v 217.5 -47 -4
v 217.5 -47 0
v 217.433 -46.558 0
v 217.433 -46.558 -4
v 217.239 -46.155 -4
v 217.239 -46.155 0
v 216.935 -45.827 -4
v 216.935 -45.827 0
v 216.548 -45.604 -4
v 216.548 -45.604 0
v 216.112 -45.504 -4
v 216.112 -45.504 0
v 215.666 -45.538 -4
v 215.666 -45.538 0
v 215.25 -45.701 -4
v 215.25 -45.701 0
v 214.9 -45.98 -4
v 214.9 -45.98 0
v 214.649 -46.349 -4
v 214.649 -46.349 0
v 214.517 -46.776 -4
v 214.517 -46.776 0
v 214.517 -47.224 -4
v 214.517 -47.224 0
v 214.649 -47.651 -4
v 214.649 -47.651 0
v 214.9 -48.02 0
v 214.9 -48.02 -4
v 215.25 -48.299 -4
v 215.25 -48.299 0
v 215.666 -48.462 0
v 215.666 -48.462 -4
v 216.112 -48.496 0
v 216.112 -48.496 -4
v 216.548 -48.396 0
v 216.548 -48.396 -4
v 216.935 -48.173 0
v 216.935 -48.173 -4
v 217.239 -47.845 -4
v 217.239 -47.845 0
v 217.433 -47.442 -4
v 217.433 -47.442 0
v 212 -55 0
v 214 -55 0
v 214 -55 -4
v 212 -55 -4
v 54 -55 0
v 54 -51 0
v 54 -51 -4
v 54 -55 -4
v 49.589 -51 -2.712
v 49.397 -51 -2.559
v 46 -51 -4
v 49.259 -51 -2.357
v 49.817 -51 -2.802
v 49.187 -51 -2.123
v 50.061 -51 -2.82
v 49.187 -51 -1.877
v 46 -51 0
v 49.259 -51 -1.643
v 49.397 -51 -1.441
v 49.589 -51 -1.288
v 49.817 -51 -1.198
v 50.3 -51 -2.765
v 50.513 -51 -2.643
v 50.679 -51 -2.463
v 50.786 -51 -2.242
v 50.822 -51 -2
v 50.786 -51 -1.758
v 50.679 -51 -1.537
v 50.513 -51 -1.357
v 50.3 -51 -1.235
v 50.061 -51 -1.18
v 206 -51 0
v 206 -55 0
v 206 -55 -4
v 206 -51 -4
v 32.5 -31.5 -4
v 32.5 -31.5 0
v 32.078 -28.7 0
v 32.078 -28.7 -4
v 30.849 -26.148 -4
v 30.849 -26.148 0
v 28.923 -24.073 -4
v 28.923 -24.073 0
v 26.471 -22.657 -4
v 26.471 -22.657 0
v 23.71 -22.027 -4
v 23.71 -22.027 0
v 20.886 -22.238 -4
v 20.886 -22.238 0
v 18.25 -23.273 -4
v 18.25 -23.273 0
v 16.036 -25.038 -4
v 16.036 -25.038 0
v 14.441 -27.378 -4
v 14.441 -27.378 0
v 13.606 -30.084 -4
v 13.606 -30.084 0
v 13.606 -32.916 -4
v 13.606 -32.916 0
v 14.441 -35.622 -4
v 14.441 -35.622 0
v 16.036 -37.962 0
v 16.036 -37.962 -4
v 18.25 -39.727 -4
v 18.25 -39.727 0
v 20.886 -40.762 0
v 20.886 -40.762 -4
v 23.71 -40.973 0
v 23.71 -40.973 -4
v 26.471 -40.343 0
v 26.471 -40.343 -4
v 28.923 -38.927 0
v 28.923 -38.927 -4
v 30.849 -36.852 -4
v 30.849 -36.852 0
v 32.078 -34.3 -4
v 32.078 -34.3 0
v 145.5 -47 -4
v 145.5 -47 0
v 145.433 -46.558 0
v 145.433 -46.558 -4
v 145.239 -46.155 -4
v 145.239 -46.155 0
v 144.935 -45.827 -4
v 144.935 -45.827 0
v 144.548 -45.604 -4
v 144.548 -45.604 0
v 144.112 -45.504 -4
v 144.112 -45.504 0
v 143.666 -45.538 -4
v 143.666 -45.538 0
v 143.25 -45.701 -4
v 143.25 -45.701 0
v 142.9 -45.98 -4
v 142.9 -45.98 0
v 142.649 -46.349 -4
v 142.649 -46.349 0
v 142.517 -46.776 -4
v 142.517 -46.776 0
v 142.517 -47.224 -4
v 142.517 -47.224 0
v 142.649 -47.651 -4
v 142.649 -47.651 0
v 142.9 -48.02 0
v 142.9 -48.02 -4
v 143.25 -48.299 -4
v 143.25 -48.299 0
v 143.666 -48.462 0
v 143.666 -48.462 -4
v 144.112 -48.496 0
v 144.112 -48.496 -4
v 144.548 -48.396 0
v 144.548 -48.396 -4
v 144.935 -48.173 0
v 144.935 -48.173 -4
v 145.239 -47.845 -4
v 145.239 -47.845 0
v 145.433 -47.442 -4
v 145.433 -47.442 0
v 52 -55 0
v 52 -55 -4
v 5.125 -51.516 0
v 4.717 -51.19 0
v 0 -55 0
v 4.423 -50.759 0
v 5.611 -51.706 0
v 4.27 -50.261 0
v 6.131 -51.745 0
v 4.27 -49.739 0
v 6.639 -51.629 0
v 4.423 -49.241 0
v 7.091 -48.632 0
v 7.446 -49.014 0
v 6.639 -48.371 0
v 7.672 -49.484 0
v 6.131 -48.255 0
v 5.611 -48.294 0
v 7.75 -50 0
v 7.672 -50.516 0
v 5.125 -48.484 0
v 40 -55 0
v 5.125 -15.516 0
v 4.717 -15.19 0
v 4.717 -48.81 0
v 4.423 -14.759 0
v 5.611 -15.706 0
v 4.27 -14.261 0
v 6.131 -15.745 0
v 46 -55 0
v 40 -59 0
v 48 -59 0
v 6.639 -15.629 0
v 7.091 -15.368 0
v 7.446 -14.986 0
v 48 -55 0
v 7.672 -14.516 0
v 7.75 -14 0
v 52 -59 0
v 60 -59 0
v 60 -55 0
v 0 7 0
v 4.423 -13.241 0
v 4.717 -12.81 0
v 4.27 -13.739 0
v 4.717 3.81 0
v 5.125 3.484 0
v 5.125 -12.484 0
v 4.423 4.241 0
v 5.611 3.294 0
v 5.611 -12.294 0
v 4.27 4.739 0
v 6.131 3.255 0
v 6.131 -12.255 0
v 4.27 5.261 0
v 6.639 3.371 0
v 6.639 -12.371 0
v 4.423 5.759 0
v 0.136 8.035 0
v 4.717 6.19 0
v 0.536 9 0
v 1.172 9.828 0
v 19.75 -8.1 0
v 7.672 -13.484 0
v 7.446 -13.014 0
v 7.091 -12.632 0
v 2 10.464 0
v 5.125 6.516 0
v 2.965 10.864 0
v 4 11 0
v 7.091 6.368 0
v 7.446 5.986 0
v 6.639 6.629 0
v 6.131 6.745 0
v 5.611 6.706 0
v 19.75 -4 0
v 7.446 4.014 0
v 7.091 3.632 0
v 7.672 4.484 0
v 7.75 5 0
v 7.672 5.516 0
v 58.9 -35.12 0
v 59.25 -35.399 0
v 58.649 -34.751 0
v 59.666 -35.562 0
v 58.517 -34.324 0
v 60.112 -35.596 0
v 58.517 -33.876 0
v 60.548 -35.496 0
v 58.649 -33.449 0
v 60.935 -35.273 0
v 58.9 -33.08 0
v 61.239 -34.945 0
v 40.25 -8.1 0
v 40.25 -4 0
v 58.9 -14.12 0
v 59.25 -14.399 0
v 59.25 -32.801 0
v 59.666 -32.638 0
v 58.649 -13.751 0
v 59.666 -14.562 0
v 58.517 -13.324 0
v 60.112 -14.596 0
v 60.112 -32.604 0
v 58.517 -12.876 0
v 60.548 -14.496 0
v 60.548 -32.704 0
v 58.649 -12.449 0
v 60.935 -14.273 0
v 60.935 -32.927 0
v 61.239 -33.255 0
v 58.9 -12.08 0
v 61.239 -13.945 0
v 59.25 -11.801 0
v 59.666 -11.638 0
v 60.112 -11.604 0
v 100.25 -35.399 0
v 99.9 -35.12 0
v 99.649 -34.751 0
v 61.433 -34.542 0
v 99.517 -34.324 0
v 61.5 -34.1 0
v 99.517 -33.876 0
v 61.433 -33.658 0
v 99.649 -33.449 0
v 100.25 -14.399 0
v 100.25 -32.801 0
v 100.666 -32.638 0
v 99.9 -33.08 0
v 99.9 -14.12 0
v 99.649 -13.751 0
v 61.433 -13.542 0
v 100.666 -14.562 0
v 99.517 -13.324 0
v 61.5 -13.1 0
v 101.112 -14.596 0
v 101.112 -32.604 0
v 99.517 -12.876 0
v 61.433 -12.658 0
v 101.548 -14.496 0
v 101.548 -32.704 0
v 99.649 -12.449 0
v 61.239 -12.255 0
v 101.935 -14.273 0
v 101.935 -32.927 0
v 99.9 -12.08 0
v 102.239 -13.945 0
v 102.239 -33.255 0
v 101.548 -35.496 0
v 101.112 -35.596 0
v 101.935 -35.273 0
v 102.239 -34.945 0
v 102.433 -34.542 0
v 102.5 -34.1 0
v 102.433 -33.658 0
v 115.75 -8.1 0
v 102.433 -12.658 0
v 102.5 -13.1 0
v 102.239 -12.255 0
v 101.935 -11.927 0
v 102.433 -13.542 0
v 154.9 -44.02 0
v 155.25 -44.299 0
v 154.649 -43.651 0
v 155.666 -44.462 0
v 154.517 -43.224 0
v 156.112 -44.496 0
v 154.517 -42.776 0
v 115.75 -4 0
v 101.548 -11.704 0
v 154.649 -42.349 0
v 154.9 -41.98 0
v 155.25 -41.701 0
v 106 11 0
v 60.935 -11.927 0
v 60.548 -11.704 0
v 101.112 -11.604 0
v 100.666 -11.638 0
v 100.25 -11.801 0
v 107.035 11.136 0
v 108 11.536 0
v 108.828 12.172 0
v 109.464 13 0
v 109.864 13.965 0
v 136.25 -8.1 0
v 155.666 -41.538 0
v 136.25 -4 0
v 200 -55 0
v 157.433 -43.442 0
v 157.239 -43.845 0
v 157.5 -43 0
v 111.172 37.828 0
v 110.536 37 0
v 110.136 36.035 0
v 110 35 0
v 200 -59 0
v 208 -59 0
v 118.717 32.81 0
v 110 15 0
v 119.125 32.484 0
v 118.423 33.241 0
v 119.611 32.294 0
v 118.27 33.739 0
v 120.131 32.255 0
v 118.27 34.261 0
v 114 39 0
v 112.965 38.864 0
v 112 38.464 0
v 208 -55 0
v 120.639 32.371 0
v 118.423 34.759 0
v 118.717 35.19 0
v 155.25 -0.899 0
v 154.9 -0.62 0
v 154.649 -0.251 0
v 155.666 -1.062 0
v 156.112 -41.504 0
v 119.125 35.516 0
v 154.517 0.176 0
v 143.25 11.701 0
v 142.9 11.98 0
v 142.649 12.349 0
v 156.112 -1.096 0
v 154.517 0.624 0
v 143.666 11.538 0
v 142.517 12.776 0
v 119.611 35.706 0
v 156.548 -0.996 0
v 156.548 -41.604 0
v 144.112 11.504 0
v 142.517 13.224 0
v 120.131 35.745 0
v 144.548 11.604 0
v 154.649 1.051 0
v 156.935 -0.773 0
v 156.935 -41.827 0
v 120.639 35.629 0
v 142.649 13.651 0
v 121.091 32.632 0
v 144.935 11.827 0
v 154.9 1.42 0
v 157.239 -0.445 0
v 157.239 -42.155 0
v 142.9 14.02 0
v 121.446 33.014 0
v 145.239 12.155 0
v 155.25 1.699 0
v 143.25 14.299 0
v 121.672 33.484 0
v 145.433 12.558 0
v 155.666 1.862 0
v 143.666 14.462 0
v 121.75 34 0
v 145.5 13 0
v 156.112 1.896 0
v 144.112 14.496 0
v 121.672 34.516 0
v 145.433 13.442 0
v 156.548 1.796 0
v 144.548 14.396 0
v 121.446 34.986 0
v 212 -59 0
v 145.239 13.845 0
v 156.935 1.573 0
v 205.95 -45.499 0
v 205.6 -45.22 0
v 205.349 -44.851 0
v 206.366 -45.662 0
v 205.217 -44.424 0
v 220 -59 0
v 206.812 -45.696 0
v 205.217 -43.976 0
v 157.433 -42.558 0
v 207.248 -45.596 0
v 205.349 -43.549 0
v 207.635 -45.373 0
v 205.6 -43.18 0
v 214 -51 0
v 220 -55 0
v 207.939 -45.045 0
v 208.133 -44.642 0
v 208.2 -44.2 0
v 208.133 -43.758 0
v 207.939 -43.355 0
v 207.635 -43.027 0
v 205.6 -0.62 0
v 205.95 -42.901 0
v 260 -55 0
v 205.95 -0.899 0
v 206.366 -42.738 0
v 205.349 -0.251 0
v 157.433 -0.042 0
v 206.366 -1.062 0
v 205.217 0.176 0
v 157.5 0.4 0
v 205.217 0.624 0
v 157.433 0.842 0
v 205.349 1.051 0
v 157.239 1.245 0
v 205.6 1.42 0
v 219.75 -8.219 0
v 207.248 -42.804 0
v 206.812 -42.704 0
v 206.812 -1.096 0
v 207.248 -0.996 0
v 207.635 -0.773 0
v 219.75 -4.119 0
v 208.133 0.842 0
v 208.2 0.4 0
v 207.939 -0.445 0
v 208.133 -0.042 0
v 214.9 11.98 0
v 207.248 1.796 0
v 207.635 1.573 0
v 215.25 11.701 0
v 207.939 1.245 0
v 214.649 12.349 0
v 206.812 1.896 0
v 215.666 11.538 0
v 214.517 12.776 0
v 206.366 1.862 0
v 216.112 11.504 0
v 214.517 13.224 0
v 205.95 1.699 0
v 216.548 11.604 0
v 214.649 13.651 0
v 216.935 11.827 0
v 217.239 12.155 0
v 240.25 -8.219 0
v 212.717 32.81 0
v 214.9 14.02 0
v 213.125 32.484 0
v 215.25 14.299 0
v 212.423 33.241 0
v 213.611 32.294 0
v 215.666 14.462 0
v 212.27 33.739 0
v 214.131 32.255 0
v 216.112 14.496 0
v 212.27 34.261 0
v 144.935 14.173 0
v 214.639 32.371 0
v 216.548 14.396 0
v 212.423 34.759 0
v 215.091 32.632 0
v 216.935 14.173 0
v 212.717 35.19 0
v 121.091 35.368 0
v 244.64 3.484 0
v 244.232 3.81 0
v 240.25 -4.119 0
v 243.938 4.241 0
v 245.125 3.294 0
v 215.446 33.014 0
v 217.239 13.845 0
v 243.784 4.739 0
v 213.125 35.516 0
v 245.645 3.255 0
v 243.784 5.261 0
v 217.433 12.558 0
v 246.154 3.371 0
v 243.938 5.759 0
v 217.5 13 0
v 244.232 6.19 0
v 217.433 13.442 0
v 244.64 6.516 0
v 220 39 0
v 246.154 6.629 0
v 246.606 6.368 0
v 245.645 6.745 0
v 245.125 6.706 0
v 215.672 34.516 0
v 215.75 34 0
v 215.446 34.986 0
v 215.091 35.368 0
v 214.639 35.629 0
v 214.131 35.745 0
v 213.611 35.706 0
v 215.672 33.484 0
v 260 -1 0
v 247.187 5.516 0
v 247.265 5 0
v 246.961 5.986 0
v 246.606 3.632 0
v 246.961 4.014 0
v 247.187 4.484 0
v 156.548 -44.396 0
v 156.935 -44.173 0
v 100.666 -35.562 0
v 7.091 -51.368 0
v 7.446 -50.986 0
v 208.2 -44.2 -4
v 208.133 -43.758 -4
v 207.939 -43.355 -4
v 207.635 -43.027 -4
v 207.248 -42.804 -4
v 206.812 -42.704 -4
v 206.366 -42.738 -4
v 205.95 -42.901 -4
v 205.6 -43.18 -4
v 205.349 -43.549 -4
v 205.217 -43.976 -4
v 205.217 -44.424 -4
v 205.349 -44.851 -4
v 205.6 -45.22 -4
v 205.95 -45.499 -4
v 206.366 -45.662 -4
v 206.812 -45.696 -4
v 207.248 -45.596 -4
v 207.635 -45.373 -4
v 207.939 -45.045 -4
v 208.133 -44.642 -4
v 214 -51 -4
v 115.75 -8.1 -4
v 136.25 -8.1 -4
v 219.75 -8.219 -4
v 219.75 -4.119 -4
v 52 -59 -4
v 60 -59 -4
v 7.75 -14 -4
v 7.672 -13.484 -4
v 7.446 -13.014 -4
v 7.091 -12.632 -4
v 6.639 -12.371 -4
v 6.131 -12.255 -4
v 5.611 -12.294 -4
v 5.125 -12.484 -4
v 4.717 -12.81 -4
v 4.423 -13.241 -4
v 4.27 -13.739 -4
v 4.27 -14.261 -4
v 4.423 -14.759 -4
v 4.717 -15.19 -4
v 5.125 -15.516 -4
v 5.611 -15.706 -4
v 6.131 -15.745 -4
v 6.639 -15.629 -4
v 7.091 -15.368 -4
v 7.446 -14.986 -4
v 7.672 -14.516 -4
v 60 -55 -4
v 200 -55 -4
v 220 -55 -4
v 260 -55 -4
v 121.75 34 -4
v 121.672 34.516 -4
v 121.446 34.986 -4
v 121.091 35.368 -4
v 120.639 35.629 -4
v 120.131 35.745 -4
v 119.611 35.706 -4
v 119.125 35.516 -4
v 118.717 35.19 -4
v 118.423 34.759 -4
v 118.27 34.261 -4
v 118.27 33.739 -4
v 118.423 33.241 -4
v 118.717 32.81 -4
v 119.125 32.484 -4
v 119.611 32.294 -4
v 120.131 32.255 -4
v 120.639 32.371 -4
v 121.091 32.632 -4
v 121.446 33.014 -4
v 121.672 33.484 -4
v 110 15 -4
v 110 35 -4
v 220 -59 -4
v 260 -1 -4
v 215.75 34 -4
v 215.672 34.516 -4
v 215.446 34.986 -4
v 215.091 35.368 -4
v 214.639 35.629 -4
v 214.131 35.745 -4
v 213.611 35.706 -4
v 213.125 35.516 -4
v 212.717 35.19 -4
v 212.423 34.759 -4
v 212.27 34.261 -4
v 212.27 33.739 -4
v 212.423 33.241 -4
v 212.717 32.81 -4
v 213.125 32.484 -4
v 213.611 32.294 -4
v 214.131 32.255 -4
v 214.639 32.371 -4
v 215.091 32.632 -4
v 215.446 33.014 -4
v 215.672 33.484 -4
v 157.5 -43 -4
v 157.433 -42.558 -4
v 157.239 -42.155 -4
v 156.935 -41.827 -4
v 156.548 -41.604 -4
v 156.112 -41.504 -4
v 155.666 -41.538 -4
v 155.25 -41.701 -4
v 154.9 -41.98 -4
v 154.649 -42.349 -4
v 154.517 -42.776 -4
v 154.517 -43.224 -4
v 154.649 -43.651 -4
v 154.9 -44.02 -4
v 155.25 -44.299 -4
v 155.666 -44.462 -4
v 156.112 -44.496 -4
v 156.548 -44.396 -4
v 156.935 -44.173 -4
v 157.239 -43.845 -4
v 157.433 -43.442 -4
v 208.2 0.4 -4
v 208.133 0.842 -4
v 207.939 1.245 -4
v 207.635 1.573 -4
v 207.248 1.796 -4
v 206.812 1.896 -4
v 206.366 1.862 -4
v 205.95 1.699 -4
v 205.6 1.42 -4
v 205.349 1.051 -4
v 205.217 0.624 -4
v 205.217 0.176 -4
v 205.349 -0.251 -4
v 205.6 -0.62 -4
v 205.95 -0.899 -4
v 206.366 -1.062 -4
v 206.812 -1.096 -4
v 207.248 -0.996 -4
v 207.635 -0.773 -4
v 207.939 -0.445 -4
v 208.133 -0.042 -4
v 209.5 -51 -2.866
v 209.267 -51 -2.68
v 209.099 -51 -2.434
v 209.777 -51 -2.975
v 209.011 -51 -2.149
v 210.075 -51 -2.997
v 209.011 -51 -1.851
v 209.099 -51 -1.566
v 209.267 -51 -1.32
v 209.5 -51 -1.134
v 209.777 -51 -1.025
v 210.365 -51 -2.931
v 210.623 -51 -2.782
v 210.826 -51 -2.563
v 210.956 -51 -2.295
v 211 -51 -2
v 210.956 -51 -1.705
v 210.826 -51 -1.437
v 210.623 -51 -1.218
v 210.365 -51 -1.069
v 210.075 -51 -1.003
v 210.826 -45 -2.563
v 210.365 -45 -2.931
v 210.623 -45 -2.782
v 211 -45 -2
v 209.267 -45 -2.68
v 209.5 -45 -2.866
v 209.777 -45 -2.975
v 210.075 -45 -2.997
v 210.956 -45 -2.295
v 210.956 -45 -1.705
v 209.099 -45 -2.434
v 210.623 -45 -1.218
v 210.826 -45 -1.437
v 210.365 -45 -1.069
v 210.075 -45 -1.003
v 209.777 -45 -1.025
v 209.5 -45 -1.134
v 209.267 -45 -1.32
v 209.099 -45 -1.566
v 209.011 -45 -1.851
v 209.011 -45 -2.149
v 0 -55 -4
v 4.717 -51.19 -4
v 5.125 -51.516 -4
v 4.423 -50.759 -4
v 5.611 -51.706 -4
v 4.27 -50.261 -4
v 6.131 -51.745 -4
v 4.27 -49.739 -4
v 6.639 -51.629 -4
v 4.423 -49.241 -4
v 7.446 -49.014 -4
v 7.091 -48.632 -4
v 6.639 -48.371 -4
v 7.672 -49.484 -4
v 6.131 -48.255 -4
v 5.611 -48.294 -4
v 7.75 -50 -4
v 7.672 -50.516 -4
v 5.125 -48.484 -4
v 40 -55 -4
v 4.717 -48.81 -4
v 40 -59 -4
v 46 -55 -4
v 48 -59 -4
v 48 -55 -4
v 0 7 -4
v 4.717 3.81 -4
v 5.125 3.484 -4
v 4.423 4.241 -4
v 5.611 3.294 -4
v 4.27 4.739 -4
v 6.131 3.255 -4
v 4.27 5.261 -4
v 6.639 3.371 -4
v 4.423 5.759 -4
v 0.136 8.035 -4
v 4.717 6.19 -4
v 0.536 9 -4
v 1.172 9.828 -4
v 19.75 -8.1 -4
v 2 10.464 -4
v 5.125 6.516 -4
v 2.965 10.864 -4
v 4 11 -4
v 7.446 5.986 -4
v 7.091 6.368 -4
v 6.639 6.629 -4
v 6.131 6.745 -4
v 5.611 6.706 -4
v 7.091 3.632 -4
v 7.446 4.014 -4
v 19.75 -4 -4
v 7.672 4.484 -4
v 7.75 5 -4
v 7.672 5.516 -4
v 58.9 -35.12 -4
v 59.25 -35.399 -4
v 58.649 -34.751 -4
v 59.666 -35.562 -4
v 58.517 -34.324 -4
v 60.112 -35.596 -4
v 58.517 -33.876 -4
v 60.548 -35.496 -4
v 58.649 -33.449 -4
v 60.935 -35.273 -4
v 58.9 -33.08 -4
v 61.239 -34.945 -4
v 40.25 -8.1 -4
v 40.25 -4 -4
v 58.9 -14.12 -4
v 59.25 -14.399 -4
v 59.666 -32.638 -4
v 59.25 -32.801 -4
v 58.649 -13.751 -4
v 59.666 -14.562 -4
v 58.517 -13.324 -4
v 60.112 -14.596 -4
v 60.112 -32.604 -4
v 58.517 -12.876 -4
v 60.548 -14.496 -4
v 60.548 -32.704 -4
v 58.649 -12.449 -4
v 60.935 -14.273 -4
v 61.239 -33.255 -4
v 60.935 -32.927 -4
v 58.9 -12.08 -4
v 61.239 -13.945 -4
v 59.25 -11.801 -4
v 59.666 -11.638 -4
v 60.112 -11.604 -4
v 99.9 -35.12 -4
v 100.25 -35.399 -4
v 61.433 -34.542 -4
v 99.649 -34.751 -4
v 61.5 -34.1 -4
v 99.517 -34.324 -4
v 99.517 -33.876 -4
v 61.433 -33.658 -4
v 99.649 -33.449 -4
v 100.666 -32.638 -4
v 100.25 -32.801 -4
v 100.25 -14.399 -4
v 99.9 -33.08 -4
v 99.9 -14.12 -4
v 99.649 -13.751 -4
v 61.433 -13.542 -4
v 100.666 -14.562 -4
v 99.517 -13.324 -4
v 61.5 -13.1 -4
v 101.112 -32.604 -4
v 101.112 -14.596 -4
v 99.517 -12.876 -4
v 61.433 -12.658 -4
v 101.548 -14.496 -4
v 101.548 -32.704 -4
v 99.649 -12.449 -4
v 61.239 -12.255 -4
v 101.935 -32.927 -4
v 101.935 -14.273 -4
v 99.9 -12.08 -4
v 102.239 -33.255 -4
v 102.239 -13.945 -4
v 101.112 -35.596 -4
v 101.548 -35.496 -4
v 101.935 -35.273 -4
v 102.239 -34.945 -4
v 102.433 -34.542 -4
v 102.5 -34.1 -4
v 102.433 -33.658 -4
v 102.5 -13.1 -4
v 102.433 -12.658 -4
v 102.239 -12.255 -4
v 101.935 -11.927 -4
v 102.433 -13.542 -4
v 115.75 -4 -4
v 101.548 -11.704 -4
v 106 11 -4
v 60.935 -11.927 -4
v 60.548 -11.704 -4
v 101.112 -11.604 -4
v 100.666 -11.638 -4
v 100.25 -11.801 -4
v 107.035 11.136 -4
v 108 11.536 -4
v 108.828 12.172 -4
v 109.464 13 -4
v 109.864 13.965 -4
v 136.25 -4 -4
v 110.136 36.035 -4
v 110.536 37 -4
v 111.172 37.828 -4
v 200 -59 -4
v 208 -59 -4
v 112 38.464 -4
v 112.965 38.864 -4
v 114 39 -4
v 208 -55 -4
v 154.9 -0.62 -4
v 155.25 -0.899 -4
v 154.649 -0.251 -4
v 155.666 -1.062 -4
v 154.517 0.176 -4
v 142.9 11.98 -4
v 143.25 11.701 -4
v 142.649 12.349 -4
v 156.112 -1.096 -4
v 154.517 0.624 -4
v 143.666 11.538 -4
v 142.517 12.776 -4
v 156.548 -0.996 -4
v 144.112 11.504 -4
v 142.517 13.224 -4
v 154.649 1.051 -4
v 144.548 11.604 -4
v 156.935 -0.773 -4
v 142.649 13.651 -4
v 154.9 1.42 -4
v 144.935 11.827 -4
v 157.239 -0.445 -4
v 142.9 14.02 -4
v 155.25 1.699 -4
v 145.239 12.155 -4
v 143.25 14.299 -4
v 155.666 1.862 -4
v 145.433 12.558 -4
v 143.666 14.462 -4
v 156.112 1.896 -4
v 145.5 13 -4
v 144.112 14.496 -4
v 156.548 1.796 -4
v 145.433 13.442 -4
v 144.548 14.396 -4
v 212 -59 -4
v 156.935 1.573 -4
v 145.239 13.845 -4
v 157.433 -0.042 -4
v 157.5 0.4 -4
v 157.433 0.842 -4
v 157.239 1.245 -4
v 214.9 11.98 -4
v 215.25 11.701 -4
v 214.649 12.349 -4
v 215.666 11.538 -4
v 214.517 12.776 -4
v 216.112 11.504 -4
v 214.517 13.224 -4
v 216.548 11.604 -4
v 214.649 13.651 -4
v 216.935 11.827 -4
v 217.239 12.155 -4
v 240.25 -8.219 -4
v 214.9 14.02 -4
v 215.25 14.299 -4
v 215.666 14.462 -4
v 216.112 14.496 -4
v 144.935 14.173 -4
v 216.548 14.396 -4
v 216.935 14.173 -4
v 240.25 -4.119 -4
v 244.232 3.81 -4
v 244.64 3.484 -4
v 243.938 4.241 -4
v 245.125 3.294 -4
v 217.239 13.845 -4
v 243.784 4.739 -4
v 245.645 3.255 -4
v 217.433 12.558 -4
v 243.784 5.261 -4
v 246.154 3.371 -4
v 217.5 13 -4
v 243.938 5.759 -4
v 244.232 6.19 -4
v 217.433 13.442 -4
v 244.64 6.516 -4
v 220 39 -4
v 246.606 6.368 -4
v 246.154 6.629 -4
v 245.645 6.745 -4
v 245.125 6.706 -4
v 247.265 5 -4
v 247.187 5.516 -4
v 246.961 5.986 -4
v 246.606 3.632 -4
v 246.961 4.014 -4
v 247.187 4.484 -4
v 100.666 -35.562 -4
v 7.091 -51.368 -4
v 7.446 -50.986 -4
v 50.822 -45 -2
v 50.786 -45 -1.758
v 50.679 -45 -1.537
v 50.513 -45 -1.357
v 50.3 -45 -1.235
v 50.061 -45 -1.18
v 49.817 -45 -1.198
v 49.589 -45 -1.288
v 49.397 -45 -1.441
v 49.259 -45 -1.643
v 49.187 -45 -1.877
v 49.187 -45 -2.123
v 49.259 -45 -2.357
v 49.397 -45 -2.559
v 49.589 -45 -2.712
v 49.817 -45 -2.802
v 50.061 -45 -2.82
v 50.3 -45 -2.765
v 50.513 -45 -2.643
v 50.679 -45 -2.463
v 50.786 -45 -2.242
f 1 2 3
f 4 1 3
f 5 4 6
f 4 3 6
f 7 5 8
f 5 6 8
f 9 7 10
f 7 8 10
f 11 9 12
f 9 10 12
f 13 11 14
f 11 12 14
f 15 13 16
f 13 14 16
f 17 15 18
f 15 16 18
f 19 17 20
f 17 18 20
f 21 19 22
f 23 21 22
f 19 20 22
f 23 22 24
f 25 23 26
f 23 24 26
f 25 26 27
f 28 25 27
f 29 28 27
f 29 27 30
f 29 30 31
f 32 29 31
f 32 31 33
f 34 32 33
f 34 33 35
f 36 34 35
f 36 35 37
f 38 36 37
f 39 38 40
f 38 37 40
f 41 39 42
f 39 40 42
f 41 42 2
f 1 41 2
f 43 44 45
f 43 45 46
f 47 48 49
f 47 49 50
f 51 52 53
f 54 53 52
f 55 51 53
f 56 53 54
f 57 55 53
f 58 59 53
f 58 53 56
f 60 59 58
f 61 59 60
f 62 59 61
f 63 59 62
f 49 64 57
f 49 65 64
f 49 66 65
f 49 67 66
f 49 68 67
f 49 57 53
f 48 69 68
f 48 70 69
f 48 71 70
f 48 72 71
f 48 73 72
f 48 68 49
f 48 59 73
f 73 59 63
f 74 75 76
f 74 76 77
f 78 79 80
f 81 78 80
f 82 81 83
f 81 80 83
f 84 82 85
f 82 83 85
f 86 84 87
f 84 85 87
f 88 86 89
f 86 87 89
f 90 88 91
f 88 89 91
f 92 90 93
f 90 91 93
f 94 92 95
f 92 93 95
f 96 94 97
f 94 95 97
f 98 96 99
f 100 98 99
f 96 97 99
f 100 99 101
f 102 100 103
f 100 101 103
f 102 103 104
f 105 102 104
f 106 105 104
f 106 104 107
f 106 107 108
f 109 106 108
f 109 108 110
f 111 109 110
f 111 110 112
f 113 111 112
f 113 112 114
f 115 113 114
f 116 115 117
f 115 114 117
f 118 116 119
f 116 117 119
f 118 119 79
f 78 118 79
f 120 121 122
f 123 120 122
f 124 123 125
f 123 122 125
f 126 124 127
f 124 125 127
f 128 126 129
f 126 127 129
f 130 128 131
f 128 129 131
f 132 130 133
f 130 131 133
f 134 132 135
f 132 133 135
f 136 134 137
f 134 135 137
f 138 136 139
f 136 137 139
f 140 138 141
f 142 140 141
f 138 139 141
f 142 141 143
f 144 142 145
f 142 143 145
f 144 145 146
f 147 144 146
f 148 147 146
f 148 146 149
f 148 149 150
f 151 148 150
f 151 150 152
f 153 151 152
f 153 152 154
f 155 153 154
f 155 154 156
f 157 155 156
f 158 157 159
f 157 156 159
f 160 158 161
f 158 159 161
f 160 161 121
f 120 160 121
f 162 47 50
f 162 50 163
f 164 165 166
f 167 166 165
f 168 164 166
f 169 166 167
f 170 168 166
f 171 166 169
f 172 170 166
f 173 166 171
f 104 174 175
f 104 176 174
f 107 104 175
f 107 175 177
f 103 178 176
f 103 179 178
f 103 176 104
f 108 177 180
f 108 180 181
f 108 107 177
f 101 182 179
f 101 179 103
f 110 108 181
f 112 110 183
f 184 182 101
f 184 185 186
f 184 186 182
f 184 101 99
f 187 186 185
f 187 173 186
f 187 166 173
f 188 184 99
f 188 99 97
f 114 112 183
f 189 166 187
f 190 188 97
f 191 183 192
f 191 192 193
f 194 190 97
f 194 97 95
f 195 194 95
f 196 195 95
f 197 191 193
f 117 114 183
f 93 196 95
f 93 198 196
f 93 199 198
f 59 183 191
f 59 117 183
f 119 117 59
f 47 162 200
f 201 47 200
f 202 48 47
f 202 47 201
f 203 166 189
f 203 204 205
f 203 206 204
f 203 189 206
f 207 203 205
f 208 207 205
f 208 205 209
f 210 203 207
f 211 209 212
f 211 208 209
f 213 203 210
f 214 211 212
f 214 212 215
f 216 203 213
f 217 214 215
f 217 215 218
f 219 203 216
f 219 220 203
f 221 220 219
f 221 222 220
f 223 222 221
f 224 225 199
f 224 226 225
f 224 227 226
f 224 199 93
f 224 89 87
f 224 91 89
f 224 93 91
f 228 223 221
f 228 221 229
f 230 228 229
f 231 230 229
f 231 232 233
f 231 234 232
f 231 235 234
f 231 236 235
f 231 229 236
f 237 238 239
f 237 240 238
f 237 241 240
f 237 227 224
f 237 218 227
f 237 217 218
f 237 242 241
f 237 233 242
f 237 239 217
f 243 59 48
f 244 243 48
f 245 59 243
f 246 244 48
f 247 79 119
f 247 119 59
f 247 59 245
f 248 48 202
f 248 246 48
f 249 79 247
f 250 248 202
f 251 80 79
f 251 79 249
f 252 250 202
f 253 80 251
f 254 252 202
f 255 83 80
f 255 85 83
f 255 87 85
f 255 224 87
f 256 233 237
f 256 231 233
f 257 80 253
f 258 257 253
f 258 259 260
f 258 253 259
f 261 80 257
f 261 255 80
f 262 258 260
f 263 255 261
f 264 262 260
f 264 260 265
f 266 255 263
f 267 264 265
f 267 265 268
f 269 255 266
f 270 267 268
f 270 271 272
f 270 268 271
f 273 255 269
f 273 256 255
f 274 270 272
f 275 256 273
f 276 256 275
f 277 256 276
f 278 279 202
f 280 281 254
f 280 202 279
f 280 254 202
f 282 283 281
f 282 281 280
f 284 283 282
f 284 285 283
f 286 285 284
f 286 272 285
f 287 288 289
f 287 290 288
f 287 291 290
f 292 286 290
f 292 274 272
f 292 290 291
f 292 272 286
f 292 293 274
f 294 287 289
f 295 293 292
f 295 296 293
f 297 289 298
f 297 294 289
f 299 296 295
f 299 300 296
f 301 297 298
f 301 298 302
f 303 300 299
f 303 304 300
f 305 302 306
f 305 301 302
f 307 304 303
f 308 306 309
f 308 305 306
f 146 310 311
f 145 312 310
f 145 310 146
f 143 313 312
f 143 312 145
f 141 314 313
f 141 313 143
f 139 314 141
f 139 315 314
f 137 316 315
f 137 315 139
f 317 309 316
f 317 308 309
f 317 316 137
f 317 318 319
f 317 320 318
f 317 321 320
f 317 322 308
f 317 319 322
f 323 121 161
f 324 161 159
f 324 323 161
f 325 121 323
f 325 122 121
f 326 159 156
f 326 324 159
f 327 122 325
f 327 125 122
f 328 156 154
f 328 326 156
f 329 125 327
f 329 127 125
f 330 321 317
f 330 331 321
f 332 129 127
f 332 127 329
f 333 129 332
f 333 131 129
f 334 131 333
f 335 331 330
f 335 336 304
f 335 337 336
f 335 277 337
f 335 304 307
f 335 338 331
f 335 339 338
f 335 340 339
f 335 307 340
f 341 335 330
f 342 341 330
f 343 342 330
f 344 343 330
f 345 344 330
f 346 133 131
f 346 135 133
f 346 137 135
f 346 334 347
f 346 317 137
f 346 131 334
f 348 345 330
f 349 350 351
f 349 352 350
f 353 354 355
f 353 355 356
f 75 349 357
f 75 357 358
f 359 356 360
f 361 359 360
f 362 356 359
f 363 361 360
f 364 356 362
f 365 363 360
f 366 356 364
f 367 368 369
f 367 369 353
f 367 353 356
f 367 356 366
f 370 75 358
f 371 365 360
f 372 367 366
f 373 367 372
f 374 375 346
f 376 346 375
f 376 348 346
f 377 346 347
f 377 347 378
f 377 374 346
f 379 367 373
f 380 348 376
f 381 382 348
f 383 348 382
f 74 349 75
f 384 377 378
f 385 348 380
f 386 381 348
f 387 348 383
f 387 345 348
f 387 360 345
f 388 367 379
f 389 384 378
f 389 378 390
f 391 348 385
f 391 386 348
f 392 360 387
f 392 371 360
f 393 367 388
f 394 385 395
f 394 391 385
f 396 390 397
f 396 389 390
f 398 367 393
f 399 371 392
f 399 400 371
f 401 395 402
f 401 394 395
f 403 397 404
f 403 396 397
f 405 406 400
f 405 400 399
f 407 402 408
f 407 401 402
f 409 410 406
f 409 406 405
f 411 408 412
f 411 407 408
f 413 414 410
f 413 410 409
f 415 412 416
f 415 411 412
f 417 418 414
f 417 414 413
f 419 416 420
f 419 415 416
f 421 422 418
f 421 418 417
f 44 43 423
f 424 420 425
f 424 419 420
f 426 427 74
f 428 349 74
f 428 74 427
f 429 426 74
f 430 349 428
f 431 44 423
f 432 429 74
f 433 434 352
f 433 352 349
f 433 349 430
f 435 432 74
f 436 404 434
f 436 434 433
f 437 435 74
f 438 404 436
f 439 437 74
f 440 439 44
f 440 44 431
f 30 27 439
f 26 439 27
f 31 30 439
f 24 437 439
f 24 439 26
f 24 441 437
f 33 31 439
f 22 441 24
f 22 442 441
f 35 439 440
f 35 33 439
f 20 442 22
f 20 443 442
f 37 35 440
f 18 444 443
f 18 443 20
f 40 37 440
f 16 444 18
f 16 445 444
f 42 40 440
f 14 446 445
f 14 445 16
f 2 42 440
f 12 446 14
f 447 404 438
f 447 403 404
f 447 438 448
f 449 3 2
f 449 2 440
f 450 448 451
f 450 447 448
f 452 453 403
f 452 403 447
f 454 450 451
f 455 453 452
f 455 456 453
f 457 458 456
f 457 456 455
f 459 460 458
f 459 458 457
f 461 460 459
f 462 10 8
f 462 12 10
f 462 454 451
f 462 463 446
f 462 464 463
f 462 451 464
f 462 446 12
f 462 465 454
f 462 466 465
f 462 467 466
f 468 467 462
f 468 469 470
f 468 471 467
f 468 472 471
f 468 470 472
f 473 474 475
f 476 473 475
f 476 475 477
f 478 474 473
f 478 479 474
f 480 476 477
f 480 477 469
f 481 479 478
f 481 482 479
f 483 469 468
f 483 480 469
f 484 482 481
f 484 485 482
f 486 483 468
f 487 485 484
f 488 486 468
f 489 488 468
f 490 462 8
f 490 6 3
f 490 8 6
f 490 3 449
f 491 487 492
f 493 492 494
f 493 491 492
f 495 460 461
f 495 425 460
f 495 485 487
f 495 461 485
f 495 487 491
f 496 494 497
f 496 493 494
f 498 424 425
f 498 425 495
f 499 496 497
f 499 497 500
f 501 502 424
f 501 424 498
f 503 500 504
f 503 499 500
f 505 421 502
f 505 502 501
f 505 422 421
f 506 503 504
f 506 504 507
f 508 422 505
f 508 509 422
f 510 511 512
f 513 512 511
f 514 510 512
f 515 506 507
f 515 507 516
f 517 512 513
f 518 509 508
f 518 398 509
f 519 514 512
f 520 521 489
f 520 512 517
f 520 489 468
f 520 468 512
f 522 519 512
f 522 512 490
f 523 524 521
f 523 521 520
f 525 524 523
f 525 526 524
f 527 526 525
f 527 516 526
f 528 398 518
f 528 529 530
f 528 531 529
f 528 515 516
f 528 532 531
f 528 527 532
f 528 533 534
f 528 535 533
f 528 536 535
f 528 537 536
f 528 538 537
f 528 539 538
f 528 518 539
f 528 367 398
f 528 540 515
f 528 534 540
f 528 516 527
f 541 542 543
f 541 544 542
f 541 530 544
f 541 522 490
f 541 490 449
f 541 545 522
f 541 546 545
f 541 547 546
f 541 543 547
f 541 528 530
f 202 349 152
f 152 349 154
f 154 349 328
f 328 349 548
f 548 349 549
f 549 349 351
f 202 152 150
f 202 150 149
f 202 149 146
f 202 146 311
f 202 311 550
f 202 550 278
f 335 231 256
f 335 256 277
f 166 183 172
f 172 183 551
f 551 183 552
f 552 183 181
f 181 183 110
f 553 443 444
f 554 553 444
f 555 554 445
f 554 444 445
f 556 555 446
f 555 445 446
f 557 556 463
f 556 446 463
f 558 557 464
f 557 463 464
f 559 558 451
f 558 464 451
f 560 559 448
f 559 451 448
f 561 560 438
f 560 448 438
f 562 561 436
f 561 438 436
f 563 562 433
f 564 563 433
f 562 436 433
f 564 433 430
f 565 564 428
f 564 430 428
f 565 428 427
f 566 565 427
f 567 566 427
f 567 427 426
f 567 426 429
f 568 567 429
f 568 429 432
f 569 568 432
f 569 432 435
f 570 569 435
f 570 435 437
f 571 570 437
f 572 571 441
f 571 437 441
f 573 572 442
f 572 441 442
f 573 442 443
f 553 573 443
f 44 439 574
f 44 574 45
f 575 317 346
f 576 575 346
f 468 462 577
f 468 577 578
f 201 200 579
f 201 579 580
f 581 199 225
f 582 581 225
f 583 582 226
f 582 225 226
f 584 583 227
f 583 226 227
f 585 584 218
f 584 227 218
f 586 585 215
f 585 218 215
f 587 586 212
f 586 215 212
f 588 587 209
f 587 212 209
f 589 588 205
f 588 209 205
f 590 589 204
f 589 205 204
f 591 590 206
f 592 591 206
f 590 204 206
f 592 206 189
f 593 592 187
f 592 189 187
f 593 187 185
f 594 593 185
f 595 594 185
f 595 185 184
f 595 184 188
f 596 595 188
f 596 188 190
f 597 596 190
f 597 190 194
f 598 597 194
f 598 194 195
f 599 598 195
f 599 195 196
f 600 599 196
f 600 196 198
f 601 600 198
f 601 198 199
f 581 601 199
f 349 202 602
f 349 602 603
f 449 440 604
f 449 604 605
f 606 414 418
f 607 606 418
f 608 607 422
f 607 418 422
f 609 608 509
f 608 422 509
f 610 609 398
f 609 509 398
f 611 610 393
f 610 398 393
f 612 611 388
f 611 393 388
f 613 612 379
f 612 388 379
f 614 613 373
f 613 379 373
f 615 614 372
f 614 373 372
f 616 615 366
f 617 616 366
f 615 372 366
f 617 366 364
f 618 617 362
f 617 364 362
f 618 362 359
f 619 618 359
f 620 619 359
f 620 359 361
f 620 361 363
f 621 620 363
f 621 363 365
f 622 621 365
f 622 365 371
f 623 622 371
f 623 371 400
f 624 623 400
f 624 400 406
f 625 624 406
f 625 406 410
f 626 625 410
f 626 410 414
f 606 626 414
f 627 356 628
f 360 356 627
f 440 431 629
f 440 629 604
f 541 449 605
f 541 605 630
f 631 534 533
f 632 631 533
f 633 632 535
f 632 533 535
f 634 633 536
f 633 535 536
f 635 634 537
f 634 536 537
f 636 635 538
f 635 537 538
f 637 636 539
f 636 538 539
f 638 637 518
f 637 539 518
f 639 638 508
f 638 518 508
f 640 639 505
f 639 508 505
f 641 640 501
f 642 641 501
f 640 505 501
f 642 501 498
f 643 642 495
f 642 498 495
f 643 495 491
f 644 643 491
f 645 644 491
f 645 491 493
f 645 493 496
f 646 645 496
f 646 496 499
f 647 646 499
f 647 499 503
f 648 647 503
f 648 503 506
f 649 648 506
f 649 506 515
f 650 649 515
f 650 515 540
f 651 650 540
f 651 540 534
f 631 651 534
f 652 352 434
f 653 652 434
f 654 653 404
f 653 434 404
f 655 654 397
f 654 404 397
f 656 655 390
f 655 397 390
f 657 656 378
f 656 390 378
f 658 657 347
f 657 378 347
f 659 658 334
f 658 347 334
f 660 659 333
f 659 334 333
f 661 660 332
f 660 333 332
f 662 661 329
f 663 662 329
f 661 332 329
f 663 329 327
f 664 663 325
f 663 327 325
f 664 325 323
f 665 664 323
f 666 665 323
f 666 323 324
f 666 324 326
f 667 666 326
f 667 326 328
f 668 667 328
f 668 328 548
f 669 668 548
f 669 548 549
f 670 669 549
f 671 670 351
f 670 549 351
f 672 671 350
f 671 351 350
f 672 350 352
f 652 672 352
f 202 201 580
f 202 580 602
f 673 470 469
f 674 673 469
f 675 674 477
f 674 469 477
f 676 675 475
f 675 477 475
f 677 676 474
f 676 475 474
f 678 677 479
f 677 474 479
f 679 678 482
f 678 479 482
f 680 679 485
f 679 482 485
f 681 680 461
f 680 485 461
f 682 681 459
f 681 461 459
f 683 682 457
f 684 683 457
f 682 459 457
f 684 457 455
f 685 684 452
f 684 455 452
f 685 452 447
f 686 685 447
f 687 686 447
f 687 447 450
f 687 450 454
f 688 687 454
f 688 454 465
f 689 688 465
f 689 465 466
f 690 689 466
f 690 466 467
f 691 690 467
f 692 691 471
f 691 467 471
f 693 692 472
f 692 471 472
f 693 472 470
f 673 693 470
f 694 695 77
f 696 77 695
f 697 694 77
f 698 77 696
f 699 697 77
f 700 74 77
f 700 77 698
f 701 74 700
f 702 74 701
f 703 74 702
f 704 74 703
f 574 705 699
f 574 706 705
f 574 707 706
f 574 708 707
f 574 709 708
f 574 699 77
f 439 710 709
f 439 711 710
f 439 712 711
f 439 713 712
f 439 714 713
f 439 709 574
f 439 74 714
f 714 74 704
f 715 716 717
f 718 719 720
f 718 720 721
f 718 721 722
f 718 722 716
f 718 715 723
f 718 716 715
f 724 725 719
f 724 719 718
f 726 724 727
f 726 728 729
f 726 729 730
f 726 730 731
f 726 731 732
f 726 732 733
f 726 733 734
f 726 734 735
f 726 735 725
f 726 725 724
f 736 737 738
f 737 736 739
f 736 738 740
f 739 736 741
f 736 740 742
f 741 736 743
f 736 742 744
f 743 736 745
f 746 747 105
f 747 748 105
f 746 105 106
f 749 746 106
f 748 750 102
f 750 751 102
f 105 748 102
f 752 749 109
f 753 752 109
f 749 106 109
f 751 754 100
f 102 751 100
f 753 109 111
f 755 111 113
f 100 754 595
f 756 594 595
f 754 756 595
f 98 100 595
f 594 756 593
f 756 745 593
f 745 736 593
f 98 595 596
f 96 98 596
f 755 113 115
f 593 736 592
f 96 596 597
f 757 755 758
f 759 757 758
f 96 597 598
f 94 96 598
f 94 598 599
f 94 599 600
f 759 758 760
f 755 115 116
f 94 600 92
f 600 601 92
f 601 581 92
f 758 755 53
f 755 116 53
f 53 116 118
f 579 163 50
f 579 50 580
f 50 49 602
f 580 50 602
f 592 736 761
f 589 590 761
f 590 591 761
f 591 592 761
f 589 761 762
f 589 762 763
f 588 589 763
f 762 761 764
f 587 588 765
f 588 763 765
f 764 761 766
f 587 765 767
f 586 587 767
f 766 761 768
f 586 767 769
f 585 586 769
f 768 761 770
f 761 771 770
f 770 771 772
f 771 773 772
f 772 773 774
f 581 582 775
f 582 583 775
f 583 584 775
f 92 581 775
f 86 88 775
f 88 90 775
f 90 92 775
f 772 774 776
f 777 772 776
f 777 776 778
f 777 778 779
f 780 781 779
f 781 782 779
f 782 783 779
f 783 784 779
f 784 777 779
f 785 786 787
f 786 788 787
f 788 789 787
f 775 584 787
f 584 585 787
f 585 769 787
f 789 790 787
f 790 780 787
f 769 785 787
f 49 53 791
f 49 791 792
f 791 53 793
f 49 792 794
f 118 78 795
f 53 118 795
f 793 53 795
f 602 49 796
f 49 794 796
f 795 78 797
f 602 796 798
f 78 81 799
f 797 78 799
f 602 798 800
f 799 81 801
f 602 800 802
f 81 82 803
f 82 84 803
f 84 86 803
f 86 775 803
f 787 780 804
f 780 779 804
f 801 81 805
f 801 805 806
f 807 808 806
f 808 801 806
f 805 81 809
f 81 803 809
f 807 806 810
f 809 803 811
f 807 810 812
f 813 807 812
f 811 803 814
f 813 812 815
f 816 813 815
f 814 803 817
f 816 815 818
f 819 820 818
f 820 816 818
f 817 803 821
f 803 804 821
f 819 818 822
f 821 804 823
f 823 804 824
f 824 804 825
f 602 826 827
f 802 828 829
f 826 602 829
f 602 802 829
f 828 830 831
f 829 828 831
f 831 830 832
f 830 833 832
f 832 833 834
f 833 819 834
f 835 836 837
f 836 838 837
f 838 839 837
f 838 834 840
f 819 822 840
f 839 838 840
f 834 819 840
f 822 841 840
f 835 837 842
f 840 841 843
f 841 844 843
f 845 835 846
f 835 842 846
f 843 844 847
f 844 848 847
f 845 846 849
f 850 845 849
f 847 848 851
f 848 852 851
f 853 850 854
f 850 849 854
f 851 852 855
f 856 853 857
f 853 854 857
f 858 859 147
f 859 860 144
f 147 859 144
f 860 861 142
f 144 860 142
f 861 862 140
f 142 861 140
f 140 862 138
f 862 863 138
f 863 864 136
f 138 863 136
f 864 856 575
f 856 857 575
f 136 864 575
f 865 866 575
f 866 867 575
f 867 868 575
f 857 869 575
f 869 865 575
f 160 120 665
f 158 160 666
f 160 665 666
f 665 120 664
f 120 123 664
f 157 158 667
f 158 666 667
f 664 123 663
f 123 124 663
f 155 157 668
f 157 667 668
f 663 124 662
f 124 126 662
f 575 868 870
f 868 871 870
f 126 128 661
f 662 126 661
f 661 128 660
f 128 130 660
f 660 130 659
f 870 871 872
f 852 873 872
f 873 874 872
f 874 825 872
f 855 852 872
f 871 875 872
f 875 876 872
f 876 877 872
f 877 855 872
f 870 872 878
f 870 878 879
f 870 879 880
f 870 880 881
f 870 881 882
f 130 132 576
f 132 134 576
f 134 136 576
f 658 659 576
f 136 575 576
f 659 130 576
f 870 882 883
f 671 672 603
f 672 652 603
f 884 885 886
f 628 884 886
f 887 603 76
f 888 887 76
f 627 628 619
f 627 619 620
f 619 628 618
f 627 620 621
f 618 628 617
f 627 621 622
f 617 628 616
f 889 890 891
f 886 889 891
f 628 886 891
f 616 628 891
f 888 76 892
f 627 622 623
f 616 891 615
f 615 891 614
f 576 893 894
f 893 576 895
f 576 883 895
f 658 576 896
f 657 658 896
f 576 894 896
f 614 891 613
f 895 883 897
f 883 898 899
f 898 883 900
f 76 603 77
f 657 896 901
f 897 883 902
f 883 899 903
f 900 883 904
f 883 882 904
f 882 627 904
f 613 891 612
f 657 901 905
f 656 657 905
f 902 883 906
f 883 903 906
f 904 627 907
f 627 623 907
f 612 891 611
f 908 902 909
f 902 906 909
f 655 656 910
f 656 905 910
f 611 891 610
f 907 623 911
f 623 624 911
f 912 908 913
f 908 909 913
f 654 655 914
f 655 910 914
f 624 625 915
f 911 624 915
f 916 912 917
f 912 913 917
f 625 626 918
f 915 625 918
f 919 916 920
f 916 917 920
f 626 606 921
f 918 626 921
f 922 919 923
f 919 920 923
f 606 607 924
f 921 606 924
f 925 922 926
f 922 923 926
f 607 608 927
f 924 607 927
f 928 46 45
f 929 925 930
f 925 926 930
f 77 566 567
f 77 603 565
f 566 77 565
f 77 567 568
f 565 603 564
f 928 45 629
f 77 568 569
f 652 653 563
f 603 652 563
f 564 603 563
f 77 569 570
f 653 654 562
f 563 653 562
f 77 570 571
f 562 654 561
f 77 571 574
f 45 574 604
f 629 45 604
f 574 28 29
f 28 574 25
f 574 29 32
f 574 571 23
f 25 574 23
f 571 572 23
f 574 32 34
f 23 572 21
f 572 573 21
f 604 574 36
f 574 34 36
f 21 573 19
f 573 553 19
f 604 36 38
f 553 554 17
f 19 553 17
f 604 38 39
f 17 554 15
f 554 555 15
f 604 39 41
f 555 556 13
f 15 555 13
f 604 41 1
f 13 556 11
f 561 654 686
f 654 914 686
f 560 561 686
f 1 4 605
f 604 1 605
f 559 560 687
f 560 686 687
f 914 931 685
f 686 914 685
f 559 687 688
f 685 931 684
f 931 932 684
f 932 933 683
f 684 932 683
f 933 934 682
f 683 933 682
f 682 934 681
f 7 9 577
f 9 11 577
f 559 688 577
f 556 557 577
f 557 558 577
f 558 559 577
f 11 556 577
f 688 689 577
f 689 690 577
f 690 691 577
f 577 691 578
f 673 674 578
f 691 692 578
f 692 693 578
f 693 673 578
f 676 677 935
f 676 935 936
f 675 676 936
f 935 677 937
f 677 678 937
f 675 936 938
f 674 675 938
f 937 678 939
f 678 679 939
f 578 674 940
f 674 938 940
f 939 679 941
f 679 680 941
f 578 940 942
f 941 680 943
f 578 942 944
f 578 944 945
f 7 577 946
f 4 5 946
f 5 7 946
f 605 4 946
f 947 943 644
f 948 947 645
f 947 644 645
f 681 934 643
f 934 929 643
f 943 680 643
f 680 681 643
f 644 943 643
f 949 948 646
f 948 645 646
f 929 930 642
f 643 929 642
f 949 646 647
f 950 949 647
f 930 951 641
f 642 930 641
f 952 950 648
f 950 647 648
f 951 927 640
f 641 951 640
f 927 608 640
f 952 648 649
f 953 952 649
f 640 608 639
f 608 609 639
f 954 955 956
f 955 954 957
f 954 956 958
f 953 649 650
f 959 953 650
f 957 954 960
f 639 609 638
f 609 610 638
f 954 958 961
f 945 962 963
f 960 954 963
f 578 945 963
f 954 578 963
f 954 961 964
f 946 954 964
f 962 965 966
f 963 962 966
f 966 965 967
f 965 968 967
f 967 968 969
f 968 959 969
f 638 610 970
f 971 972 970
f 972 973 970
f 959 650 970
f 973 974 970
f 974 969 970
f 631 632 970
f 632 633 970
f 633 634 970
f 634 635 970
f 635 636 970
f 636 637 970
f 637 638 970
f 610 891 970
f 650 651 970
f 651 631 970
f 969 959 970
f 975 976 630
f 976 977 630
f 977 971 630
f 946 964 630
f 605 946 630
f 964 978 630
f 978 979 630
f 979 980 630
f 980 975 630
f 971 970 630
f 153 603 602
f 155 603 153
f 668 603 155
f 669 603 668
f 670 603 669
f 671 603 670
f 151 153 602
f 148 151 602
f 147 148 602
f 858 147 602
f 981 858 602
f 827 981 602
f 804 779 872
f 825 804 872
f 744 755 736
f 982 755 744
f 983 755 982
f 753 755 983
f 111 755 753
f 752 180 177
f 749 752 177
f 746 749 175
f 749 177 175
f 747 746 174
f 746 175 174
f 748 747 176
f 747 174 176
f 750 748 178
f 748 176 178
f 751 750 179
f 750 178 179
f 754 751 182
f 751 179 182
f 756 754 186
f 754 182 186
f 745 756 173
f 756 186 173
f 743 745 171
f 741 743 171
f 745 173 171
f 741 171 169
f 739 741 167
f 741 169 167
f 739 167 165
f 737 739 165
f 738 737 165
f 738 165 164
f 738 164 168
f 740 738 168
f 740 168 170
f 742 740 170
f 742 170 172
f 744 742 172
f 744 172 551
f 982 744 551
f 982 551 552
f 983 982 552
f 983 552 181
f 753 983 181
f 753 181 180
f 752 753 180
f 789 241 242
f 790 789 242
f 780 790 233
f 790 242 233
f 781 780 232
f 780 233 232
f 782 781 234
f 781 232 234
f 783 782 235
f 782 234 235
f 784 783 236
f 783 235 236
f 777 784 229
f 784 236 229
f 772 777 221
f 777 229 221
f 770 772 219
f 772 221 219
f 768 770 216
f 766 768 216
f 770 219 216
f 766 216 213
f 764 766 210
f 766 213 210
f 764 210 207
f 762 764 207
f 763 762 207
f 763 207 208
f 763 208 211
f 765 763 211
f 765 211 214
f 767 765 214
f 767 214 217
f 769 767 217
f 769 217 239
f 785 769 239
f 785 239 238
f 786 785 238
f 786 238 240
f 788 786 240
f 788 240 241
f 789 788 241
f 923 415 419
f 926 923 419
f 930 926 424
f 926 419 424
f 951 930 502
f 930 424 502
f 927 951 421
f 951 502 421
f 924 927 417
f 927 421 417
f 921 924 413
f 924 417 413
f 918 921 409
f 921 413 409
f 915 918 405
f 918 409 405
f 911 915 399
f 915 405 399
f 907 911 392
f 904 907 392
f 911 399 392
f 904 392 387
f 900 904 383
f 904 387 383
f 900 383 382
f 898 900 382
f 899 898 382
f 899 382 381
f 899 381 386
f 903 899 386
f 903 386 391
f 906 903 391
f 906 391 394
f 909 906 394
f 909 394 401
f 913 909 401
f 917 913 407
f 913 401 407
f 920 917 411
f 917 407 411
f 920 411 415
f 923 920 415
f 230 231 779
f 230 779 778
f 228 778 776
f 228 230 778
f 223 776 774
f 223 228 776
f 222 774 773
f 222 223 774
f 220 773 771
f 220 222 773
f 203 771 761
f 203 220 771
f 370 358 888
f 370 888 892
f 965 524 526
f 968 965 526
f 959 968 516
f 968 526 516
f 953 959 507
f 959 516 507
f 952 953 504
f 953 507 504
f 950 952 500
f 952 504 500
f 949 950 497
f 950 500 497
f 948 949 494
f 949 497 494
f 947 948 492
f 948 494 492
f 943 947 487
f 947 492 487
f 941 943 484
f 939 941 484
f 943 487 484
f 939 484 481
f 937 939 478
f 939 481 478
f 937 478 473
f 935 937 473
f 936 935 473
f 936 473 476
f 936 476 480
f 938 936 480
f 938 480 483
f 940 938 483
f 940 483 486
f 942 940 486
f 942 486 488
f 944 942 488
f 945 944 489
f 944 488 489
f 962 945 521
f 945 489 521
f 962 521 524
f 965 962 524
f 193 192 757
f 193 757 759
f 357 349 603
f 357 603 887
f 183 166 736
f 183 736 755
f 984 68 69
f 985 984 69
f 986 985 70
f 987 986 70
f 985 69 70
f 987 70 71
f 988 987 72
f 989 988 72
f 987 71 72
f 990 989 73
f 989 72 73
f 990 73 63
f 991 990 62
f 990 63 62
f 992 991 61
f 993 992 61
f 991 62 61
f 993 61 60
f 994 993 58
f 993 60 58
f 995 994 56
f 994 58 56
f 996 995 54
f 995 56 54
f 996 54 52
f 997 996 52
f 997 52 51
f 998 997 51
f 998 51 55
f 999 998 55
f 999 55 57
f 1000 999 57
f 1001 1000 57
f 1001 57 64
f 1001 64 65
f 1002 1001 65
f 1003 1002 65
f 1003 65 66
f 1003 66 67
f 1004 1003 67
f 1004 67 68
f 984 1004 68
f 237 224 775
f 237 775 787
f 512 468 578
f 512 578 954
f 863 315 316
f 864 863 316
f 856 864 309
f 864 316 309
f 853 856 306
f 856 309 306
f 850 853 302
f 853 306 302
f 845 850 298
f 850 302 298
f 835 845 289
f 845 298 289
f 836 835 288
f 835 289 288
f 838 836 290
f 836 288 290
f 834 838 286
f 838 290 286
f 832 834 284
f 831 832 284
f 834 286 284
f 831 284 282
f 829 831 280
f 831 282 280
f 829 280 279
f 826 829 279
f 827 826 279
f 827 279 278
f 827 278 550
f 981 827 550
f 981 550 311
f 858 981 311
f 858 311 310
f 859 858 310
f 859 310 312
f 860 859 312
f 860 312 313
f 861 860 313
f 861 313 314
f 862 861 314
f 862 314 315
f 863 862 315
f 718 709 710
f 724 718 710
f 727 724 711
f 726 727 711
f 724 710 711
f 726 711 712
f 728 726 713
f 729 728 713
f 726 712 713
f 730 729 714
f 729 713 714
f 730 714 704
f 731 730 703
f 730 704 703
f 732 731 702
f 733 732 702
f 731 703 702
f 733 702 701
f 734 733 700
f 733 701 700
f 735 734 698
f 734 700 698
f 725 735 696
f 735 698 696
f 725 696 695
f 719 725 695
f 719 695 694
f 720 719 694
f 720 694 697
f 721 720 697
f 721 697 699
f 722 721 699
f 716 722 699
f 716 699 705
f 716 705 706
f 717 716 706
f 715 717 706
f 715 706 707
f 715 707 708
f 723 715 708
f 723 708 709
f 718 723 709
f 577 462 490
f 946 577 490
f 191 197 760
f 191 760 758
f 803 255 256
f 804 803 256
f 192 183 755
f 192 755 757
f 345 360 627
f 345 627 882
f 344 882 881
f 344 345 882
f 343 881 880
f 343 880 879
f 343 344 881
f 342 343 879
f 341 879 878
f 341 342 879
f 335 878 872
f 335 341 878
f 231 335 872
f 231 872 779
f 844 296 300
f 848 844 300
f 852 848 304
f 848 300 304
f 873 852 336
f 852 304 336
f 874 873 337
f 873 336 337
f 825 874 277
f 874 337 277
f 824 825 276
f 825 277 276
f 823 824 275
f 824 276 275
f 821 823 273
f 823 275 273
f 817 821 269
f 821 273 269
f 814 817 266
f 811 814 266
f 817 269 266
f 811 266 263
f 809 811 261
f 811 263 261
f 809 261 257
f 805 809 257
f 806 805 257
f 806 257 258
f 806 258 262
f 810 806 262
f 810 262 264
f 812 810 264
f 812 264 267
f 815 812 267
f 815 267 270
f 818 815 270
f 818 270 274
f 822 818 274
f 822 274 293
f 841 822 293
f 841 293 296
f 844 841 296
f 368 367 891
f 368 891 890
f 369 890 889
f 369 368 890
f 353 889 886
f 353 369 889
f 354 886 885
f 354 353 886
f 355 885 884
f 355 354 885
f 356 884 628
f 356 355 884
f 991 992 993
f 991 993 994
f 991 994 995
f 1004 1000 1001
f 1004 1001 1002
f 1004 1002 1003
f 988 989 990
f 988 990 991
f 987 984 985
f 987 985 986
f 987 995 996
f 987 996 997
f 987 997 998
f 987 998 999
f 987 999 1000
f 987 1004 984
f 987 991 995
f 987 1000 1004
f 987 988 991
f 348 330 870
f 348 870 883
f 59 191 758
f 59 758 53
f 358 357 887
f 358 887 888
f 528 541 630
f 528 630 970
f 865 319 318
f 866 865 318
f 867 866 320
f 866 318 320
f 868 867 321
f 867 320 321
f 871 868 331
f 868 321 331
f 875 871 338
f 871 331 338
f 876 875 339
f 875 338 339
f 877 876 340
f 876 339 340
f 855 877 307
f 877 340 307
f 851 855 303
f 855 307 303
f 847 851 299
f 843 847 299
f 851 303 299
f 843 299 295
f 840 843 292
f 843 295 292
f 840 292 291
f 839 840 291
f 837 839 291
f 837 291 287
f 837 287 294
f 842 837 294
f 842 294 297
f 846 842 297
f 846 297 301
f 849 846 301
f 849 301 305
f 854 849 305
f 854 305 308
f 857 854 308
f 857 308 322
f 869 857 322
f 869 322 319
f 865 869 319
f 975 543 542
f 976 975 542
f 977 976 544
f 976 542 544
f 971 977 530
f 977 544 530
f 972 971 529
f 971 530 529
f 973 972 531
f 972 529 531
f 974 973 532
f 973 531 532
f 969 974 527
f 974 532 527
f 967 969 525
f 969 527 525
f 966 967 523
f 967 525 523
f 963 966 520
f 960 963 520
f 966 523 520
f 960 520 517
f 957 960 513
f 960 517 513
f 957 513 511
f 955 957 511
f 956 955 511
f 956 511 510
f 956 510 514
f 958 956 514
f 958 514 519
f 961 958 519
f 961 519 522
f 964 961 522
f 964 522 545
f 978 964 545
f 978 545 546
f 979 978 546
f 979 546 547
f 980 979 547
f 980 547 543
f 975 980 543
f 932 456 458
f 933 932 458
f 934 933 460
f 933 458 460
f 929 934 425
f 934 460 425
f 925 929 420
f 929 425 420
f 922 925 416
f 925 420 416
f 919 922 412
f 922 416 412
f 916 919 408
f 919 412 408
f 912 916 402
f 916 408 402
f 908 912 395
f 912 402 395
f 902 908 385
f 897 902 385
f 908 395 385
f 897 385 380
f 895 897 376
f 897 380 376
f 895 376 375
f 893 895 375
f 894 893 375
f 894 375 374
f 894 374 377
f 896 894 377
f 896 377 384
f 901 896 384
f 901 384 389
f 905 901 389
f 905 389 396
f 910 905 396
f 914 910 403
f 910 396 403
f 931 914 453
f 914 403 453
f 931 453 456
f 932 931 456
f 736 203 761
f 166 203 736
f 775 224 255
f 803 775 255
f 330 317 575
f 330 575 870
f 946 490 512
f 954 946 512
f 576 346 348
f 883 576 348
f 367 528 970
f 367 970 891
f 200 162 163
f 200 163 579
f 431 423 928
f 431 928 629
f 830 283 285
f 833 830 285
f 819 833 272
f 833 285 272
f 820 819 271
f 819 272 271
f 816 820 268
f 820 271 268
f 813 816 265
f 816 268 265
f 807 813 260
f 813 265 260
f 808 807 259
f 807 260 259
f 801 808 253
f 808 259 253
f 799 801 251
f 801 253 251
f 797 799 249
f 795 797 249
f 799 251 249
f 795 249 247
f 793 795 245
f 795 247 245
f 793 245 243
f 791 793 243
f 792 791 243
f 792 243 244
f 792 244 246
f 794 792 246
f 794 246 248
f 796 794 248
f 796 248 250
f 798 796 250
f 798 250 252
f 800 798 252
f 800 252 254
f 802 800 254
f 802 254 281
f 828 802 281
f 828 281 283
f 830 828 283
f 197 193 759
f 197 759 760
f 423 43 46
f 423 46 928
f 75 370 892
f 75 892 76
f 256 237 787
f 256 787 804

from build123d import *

# Parameters (mm, degrees)
SKETCH_1_R             = 9.5
SKETCH_1_R_2           = 1.5
SKETCH_1_W             = 20.5
SKETCH_1_H             = 4.1
SM_BASE_FLANGE_1_DEPTH = 4
SKETCH_6_R             = 1.75
CUT_EXTRUDE_1_DEPTH    = 267.640207021
SKETCH_8_R             = 1
SKETCH_8_R_2           = 0.822154456
CUT_EXTRUDE_3_DEPTH    = 10
CUT_EXTRUDE_4_REACH    = 268.64
SKETCH_9_R             = 1.5


# Sheet-metal steps are written as plain solids
with BuildPart() as part:
    # Sketch 1 → Базовая кромка1 (new body)
    with BuildSketch(Plane.XY):
        with BuildLine():
            Line((52, -59), (60, -59))
            Line((60, -59), (60, -55))
            Line((60, -55), (200, -55))
            Line((200, -55), (200, -59))
            Line((200, -59), (208, -59))
            Line((208, -59), (208, -55))
            Line((208, -55), (206, -55))
            Line((206, -55), (206, -51))
            Line((206, -51), (214, -51))
            Line((214, -51), (214, -55))
            Line((214, -55), (212, -55))
            Line((212, -55), (212, -59))
            Line((212, -59), (220, -59))
            Line((220, -59), (220, -55))
            Line((220, -55), (260, -55))
            Line((260, -55), (260, -1))
            Line((260, -1), (220, 39))
            Line((220, 39), (120, 39))
            Line((120, 39), (114, 39))
            ThreePointArc((114, 39), (111.171572875, 37.828427125), (110, 35))
            Line((110, 35), (110, 15))
            ThreePointArc((110, 15), (108.828427125, 12.171572875), (106, 11))
            Line((106, 11), (4, 11))
            ThreePointArc((4, 11), (1.171572875, 9.828427125), (0, 7))
            Line((0, 7), (0, 0))
            Line((0, 0), (0, -55))
            Line((0, -55), (40, -55))
            Line((40, -55), (40, -59))
            Line((40, -59), (48, -59))
            Line((48, -59), (48, -55))
            Line((48, -55), (46, -55))
            Line((46, -55), (46, -51))
            Line((46, -51), (54, -51))
            Line((54, -51), (54, -55))
            Line((54, -55), (52, -55))
            Line((52, -55), (52, -59))
        make_face()
        with Locations((23, -31.5)):
            Circle(SKETCH_1_R, mode=Mode.SUBTRACT)
        with Locations((156, -43)):
            Circle(SKETCH_1_R_2, mode=Mode.SUBTRACT)
        with Locations((206.7, 0.4)):
            Circle(SKETCH_1_R_2, mode=Mode.SUBTRACT)
        with Locations((156, 0.4)):
            Circle(SKETCH_1_R_2, mode=Mode.SUBTRACT)
        with Locations((206.7, -44.2)):
            Circle(SKETCH_1_R_2, mode=Mode.SUBTRACT)
        with Locations((144, -47)):
            Circle(SKETCH_1_R_2, mode=Mode.SUBTRACT)
        with Locations((216, -47)):
            Circle(SKETCH_1_R_2, mode=Mode.SUBTRACT)
        with Locations((216, 13)):
            Circle(SKETCH_1_R_2, mode=Mode.SUBTRACT)
        with Locations((144, 13)):
            Circle(SKETCH_1_R_2, mode=Mode.SUBTRACT)
        with Locations((30, -6.05)):
            Rectangle(SKETCH_1_W, SKETCH_1_H, mode=Mode.SUBTRACT)
        with Locations((230, -6.169027082)):
            Rectangle(SKETCH_1_W, SKETCH_1_H, mode=Mode.SUBTRACT)
        with Locations((126, -6.05)):
            Rectangle(SKETCH_1_W, SKETCH_1_H, mode=Mode.SUBTRACT)
    extrude(amount=-SM_BASE_FLANGE_1_DEPTH)

    # Эскиз6 → Вырез-Вытянуть1 (cut, through all)
    with BuildSketch(Plane.XY):
        with Locations((6, 5)):
            Circle(SKETCH_6_R)
        with Locations((120, 34)):
            Circle(SKETCH_6_R)
        with Locations((214, 34)):
            Circle(SKETCH_6_R)
        with Locations((245.514718626, 5)):
            Circle(SKETCH_6_R)
        with Locations((6, -14)):
            Circle(SKETCH_6_R)
        with Locations((6, -50)):
            Circle(SKETCH_6_R)
    extrude(amount=-CUT_EXTRUDE_1_DEPTH, mode=Mode.SUBTRACT)

    # Эскиз8 → Вырез-Вытянуть3 (cut)
    with BuildSketch(Plane.XZ.offset(55)):
        with Locations((210, -2)):
            Circle(SKETCH_8_R)
        with Locations((50, -2)):
            Circle(SKETCH_8_R_2)
    extrude(amount=-CUT_EXTRUDE_3_DEPTH, mode=Mode.SUBTRACT)

    # Эскиз9 → Вырез-Вытянуть4 (cut, up to next)
    with BuildSketch(Plane.XY, mode=Mode.PRIVATE) as cut_extrude_4_sk1:
        with Locations((60, -13.1)):
            Circle(SKETCH_9_R)
    cut_extrude_4_tool1 = extrude(cut_extrude_4_sk1.sketch, amount=-CUT_EXTRUDE_4_REACH, mode=Mode.PRIVATE) & part.part
    # Эскиз9 → Вырез-Вытянуть4 (cut, up to next)
    with BuildSketch(Plane.XY, mode=Mode.PRIVATE) as cut_extrude_4_sk2:
        with Locations((101, -34.1)):
            Circle(SKETCH_9_R)
    cut_extrude_4_tool2 = extrude(cut_extrude_4_sk2.sketch, amount=-CUT_EXTRUDE_4_REACH, mode=Mode.PRIVATE) & part.part
    # Эскиз9 → Вырез-Вытянуть4 (cut, up to next)
    with BuildSketch(Plane.XY, mode=Mode.PRIVATE) as cut_extrude_4_sk3:
        with Locations((101, -13.1)):
            Circle(SKETCH_9_R)
    cut_extrude_4_tool3 = extrude(cut_extrude_4_sk3.sketch, amount=-CUT_EXTRUDE_4_REACH, mode=Mode.PRIVATE) & part.part
    # Эскиз9 → Вырез-Вытянуть4 (cut, up to next)
    with BuildSketch(Plane.XY, mode=Mode.PRIVATE) as cut_extrude_4_sk4:
        with Locations((60, -34.1)):
            Circle(SKETCH_9_R)
    cut_extrude_4_tool4 = extrude(cut_extrude_4_sk4.sketch, amount=-CUT_EXTRUDE_4_REACH, mode=Mode.PRIVATE) & part.part
    add(cut_extrude_4_tool1.solids().sort_by_distance((60, -13.1, 0))[0], mode=Mode.SUBTRACT)
    add(cut_extrude_4_tool2.solids().sort_by_distance((101, -34.1, 0))[0], mode=Mode.SUBTRACT)
    add(cut_extrude_4_tool3.solids().sort_by_distance((101, -13.1, 0))[0], mode=Mode.SUBTRACT)
    add(cut_extrude_4_tool4.solids().sort_by_distance((60, -34.1, 0))[0], mode=Mode.SUBTRACT)


solid = part.part
